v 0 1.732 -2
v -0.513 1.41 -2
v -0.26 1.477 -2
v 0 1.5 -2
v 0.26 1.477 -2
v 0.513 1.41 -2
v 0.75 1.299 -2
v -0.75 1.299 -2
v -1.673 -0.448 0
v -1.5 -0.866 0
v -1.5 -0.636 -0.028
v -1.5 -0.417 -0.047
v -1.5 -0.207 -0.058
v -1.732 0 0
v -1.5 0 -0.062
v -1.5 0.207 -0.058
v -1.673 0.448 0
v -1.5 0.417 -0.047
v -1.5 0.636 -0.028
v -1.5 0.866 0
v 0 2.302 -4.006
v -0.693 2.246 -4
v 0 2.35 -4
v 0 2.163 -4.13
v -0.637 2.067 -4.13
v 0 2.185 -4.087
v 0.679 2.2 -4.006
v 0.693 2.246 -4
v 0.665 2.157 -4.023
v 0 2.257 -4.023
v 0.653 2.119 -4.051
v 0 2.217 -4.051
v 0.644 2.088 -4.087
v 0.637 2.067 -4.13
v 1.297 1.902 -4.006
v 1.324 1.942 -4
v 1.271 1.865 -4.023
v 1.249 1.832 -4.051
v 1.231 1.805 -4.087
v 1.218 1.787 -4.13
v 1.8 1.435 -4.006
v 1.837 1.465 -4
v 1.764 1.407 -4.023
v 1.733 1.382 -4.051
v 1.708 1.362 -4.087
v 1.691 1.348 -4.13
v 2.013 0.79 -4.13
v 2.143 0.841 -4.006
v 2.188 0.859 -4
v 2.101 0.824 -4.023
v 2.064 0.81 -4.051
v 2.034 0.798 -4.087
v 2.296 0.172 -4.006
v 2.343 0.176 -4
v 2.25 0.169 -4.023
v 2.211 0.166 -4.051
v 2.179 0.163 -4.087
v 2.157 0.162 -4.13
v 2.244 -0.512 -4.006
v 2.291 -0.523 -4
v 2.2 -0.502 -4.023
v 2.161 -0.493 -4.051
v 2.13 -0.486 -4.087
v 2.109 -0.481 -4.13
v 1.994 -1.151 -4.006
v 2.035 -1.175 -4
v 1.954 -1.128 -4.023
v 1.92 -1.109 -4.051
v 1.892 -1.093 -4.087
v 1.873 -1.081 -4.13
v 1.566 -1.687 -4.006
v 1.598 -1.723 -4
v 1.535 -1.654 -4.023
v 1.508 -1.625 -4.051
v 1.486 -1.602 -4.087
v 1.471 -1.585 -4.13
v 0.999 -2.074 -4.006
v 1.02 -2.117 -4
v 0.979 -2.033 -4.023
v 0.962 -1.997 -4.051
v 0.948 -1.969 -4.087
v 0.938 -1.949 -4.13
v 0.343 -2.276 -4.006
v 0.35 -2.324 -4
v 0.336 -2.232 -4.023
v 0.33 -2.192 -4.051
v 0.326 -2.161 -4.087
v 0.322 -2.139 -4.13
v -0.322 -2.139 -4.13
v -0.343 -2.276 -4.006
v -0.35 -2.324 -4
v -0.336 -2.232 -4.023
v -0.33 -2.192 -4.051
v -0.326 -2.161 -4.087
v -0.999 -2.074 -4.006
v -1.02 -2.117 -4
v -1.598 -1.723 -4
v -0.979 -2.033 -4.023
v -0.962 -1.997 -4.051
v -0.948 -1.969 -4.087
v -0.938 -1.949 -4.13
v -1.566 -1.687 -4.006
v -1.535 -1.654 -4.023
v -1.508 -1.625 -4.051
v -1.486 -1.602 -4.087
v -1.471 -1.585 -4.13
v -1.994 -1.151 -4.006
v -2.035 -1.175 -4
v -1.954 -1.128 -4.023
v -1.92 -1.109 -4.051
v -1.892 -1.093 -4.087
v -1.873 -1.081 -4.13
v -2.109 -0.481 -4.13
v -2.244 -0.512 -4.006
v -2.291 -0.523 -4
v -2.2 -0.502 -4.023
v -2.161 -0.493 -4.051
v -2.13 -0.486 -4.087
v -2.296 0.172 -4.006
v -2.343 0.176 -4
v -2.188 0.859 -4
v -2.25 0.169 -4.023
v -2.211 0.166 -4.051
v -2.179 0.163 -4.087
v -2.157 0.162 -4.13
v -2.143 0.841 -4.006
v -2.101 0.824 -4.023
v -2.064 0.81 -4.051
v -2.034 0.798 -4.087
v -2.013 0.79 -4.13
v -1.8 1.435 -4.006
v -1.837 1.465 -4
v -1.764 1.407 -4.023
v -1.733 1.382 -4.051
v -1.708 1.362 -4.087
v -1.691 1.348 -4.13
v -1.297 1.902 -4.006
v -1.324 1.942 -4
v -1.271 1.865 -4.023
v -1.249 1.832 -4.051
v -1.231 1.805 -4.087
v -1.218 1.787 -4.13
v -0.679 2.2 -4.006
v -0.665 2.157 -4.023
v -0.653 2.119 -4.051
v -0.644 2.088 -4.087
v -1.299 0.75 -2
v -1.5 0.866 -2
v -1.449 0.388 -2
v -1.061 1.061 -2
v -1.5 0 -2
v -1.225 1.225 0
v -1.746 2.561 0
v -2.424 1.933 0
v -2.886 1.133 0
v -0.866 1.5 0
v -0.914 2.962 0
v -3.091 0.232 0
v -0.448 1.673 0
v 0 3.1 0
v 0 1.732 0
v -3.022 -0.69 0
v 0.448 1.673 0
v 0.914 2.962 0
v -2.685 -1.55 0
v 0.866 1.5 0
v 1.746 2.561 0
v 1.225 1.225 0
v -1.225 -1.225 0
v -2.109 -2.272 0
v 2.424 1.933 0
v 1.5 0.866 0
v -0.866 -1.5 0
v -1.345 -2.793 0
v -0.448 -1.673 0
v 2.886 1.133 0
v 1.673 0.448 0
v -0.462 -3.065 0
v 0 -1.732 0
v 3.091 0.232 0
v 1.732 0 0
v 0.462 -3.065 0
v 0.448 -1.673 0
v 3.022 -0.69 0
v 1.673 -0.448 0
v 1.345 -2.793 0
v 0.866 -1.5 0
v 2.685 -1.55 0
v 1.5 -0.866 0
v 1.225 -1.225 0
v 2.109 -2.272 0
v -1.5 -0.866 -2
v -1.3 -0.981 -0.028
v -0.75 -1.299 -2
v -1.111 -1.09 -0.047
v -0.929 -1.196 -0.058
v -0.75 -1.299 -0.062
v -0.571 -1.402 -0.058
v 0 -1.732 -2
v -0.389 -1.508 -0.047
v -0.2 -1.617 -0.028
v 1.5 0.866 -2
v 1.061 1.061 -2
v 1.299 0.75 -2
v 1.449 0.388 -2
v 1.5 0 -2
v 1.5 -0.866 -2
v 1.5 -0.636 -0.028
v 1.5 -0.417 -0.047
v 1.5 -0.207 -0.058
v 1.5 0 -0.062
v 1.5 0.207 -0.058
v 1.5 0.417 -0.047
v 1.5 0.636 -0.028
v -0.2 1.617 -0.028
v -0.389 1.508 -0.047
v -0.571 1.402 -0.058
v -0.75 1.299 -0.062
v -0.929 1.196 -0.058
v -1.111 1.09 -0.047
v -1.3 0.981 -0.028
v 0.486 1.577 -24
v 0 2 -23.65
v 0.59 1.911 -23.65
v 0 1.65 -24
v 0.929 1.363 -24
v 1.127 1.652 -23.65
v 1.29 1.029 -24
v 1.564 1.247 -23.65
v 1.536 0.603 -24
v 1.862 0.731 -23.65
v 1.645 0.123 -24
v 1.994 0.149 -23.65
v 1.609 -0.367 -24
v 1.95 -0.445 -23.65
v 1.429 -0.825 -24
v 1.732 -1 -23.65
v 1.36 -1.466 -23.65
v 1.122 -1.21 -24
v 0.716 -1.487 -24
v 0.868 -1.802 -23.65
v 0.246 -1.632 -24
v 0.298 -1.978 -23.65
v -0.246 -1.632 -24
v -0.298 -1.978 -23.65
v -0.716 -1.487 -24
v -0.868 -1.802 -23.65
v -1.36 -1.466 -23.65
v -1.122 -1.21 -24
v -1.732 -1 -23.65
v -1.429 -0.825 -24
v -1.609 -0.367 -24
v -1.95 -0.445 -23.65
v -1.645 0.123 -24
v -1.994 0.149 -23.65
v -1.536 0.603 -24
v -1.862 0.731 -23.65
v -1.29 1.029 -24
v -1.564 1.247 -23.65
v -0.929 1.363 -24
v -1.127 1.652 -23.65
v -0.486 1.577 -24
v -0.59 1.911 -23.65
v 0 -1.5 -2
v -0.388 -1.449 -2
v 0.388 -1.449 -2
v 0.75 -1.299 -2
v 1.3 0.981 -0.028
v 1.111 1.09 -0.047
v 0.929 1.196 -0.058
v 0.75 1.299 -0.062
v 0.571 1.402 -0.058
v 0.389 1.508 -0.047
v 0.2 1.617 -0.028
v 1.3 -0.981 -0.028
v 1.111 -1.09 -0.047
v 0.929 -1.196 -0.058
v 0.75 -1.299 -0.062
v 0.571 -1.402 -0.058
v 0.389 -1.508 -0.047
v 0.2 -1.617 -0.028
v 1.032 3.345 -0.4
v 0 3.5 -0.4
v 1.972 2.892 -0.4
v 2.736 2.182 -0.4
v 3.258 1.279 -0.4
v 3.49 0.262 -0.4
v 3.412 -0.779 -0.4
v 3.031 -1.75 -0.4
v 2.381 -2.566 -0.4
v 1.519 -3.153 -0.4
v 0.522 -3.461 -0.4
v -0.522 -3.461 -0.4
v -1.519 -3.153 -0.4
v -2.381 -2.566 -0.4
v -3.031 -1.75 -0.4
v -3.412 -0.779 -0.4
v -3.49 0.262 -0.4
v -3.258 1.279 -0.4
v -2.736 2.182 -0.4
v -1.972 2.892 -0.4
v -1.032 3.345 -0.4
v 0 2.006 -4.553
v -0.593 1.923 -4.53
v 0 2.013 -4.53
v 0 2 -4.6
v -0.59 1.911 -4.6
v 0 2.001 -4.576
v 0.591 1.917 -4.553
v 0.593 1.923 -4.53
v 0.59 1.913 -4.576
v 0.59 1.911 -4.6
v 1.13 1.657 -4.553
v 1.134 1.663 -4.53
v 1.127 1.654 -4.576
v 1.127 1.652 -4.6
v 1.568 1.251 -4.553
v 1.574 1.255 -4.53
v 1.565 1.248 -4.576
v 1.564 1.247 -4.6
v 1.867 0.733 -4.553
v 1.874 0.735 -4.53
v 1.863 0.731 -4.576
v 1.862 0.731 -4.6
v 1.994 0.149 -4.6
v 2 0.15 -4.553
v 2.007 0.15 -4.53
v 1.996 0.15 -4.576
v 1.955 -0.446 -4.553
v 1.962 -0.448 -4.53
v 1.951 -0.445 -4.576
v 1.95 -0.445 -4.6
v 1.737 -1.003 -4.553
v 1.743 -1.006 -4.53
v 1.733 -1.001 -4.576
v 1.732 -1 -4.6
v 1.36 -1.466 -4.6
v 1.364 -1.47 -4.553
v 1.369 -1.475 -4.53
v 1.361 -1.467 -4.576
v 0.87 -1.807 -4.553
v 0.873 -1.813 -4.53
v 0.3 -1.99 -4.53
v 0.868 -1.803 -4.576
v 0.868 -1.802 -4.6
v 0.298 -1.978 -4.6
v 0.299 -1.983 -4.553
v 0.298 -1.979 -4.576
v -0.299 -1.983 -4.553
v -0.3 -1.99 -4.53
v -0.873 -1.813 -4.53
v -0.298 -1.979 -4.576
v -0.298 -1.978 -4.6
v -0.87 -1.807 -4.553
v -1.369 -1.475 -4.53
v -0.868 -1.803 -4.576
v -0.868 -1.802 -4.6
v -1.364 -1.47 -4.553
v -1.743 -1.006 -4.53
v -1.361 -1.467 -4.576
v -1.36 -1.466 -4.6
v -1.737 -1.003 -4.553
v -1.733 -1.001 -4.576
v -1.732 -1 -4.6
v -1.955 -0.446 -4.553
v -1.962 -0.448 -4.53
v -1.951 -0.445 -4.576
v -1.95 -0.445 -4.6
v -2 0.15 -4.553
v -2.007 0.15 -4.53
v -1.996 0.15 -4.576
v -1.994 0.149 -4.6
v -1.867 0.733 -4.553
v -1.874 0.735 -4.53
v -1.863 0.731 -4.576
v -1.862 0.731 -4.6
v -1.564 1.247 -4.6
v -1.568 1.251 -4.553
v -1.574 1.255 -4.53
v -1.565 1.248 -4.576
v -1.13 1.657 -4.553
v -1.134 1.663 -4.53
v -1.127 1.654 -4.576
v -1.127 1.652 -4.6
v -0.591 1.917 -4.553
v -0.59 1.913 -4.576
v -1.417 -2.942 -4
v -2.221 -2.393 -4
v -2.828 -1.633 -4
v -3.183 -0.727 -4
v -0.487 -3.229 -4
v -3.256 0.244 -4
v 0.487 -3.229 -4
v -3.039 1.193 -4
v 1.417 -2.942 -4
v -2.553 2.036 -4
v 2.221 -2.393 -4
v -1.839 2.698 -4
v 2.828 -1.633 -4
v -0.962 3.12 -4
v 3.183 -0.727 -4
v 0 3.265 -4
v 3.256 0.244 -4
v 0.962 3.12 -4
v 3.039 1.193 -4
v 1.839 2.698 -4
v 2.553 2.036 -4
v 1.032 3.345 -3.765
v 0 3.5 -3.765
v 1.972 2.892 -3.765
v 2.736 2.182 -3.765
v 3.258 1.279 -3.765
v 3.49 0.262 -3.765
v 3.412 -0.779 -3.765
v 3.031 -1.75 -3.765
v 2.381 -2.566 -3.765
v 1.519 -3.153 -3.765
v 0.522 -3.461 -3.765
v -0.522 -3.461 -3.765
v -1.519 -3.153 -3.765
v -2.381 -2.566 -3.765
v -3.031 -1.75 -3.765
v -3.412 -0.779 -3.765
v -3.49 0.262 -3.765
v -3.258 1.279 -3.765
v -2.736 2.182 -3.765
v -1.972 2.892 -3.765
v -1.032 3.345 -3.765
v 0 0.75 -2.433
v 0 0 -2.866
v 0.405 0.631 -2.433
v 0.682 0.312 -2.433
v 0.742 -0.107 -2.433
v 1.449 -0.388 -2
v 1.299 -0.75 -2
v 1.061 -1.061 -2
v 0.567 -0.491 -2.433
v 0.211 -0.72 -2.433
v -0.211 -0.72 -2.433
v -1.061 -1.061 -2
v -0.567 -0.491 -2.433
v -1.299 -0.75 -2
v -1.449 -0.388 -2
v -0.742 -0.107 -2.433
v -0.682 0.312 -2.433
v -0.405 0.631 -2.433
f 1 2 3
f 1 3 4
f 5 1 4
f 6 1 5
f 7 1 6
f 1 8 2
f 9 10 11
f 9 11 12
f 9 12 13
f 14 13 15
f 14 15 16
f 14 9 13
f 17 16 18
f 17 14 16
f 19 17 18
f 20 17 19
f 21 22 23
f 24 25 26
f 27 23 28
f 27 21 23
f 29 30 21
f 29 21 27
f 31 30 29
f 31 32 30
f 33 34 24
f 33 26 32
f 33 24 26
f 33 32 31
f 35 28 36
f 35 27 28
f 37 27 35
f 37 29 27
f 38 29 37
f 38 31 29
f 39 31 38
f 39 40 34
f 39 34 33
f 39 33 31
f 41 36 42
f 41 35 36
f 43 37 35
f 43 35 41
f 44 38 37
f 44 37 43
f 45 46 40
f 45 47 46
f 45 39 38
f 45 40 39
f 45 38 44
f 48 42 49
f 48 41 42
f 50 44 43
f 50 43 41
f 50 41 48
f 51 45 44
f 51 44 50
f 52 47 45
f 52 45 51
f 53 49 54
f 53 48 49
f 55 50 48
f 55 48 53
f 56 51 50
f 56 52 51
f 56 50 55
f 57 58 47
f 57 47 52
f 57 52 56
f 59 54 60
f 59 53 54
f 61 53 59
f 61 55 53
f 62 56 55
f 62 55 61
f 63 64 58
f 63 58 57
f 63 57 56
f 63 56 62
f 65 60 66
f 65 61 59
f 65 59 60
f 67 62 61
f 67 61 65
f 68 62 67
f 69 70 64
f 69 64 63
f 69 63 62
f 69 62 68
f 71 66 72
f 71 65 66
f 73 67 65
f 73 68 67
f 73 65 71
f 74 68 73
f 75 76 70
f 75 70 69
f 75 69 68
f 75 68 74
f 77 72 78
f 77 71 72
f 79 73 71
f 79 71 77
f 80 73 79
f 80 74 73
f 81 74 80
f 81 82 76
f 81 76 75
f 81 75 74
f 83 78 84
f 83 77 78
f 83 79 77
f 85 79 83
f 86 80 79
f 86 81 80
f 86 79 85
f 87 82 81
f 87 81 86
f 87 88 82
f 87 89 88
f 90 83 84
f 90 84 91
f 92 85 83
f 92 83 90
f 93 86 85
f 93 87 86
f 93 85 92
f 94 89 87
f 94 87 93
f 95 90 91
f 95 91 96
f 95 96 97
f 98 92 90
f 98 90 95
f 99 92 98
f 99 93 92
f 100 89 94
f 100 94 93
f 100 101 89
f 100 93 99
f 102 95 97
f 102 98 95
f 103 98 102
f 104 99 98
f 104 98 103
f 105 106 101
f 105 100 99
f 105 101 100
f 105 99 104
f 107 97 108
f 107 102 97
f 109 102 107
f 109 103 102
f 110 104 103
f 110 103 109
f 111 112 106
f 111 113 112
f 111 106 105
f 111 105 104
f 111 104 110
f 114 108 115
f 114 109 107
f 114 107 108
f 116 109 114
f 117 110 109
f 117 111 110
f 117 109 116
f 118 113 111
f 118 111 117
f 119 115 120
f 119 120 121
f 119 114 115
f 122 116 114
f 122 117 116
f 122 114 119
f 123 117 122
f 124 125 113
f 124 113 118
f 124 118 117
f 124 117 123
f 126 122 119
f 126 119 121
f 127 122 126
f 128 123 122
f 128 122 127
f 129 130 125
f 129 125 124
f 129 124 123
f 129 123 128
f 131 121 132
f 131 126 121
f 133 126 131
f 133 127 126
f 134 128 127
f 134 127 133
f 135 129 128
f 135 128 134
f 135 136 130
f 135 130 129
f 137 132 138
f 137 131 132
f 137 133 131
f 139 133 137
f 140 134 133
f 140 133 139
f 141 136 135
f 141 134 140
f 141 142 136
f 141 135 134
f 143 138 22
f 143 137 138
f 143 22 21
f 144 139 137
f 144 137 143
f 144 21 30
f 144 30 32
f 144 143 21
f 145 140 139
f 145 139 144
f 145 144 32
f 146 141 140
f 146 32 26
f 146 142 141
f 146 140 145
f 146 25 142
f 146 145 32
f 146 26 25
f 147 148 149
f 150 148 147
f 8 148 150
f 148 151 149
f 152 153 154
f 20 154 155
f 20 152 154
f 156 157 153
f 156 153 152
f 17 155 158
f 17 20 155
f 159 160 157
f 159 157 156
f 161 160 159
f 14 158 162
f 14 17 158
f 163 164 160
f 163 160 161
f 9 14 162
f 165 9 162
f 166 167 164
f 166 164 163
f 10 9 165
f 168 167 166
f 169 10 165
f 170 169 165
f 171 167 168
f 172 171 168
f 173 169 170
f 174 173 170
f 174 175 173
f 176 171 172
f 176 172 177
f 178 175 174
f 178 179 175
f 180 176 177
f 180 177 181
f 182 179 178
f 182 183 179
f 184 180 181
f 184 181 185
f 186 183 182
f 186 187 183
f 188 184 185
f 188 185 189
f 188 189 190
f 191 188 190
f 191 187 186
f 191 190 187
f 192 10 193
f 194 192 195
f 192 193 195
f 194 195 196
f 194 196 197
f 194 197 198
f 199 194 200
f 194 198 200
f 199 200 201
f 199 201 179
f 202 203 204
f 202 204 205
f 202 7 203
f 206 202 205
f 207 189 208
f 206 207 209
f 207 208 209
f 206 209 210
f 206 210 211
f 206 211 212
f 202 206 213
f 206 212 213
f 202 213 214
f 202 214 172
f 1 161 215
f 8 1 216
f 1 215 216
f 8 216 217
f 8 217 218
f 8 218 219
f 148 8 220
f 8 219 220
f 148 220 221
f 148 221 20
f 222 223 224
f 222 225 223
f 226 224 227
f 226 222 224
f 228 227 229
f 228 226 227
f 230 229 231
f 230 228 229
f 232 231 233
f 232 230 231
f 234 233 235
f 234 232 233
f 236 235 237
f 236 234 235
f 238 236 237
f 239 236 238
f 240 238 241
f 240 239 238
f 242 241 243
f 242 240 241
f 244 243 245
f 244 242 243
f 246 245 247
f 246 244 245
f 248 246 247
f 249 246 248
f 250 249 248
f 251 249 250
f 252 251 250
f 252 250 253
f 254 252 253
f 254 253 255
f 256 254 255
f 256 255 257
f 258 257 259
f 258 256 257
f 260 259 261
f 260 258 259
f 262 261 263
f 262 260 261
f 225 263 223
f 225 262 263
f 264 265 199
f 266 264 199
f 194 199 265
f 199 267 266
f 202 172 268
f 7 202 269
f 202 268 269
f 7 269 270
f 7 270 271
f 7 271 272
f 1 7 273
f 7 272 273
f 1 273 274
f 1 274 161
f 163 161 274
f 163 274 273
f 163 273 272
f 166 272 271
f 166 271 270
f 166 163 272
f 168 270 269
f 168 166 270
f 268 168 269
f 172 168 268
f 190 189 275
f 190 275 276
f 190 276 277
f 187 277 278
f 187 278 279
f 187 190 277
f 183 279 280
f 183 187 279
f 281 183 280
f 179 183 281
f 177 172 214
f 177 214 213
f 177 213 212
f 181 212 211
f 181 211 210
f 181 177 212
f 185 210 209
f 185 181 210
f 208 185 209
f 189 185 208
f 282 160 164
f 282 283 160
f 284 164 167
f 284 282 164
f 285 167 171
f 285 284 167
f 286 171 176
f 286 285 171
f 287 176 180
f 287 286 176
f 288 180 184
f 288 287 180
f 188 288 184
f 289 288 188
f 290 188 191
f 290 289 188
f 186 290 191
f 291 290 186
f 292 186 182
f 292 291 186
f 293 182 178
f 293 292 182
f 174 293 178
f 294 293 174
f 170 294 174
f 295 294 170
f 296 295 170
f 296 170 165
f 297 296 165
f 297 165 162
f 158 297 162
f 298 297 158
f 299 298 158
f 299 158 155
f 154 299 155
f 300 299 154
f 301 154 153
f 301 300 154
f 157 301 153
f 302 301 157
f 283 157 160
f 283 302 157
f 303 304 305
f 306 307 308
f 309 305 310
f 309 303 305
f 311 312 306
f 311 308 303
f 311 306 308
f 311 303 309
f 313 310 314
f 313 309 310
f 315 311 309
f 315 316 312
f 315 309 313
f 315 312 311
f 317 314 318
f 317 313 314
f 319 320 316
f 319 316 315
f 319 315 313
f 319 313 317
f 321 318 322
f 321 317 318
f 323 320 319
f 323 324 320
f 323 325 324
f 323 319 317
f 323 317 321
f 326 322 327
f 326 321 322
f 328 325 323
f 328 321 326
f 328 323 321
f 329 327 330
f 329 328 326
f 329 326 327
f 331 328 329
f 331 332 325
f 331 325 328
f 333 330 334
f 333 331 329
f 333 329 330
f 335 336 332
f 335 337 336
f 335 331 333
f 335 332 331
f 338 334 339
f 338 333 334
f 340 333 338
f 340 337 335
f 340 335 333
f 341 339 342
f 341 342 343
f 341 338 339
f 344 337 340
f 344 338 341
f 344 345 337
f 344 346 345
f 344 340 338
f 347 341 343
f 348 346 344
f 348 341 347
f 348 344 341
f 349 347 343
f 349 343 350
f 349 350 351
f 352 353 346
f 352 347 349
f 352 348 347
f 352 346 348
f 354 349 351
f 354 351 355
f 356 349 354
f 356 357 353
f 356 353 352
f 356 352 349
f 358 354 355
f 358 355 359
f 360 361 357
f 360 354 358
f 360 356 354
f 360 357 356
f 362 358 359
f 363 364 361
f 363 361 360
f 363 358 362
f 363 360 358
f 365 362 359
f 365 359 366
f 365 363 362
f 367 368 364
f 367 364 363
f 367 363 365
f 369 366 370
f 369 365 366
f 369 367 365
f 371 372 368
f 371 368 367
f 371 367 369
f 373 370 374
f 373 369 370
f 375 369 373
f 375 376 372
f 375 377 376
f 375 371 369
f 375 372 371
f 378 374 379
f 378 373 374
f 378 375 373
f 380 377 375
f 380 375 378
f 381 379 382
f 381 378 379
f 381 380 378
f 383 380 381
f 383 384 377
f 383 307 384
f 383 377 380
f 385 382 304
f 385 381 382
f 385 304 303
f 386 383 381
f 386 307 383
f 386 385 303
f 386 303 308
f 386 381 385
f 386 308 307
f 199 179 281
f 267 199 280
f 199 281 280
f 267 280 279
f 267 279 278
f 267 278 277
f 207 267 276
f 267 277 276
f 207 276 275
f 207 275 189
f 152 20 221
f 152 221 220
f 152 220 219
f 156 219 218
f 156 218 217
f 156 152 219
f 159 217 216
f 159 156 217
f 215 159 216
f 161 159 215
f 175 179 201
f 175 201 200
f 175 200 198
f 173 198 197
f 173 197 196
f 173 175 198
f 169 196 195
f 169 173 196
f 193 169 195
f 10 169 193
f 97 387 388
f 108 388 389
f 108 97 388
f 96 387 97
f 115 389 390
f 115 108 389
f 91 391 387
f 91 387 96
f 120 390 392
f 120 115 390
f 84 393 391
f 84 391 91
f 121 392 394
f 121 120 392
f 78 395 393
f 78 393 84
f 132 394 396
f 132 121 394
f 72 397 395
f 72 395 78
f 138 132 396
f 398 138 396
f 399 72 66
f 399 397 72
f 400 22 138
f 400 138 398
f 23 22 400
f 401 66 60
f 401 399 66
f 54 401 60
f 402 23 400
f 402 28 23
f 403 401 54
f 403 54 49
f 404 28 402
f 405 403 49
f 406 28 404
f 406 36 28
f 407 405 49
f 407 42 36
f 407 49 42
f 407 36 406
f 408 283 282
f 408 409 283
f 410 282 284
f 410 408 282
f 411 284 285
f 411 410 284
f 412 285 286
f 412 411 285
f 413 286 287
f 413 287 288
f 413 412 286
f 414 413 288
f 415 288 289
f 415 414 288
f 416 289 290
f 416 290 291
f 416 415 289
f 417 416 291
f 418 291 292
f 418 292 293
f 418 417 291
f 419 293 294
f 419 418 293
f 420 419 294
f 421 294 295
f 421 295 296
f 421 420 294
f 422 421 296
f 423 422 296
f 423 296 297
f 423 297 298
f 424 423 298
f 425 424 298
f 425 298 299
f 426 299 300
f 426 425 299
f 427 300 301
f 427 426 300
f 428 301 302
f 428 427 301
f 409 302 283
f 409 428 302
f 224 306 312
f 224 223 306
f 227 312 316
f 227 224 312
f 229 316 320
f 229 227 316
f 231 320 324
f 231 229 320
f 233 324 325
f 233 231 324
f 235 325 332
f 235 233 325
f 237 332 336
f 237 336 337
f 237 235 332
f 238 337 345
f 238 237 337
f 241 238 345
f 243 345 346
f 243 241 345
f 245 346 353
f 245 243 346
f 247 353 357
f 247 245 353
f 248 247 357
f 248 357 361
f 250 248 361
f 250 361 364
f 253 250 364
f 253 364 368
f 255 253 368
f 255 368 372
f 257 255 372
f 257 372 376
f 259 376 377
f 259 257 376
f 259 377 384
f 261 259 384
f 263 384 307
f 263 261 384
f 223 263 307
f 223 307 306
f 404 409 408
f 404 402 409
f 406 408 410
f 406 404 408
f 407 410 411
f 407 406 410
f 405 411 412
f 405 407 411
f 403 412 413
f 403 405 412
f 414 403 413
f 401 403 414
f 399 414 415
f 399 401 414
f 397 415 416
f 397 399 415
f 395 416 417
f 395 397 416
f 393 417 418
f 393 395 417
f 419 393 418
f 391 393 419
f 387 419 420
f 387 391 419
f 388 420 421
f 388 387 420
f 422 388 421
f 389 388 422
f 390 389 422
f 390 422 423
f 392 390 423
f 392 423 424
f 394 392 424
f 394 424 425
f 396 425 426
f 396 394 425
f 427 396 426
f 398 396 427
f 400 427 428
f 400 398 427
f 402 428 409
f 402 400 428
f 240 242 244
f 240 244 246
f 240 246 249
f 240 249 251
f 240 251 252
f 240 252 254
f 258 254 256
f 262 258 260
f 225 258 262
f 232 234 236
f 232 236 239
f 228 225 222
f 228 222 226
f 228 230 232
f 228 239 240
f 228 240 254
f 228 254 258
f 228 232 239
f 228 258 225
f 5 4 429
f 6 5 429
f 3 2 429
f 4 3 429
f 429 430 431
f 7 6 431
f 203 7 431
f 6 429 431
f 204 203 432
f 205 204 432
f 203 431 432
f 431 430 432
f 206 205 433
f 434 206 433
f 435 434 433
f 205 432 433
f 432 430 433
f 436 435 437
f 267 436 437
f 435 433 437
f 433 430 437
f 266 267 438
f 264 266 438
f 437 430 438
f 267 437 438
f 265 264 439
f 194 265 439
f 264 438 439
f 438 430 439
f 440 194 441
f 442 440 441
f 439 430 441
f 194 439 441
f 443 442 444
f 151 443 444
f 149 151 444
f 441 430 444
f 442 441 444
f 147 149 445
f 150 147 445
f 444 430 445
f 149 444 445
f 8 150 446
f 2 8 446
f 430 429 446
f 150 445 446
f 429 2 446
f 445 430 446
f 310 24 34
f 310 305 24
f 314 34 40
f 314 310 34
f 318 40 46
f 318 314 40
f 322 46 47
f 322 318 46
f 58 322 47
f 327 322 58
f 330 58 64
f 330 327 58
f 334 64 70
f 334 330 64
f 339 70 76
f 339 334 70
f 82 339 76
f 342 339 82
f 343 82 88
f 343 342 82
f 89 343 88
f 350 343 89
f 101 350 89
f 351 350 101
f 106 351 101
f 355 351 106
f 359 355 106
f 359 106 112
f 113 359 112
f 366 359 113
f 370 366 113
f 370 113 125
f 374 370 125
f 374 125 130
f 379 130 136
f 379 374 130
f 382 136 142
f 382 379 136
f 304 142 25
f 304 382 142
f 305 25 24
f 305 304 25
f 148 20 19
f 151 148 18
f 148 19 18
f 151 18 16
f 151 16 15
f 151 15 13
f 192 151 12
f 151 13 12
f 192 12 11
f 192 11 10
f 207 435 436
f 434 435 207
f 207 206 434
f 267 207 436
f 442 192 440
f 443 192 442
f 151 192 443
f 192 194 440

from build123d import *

# Parameters (mm, degrees)
CUT_EXTRUDE1_DEPTH = 2


with BuildPart() as part:
    # Sketch1 → Revolve1 (revolve)
    with BuildSketch(Plane(origin=(0, 0, 0), x_dir=(0, 0, -1), z_dir=(1, 0, 0))):
        with BuildLine():
            Line((0, 0), (0, 3.1))
            Line((0, 3.1), (0.4, 3.5))
            Line((0.4, 3.5), (3.765, 3.5))
            Line((3.765, 3.5), (4, 3.265))
            Line((4, 3.265), (4, 2.35))
            ThreePointArc((4, 2.35), (4.035614876, 2.236081032), (4.129775312, 2.162734164))
            Line((4.129775312, 2.162734164), (4.529775312, 2.012734164))
            ThreePointArc((4.529775312, 2.012734164), (4.564315039, 2.00320929), (4.6, 2))
            Line((4.6, 2), (23.65, 2))
            Line((23.65, 2), (24, 1.65))
            Line((24, 1.65), (24, 0))
            Line((24, 0), (0, 0))
        make_face()
    revolve(axis=Axis((0, 0, 0), (0, 0, -1)))

    # Sketch2 → Cut-Extrude1 (cut)
    with BuildSketch(Plane.XY):
        Polygon((0, 1.732050808), (-1.5, 0.866025404), (-1.5, -0.866025404), (0, -1.732050808), (1.5, -0.866025404), (1.5, 0.866025404), align=None)
    extrude(amount=-CUT_EXTRUDE1_DEPTH, mode=Mode.SUBTRACT)

    # Sketch3 → Cut-Revolve2 (revolve, cut)
    with BuildSketch(Plane(origin=(0, 0, 0), x_dir=(0, 0, -1), z_dir=(1, 0, 0))):
        Polygon((2, 0), (2, 1.5), (2.866025404, 0), align=None)
    revolve(axis=Axis((0, 0, -2), (0, 0, -1)), mode=Mode.SUBTRACT)

    # Sketch4 → Cut-Revolve3 (revolve, cut)
    with BuildSketch(Plane(origin=(0, 0, 0), x_dir=(0, 0, -1), z_dir=(1, 0, 0))):
        Polygon((0, 1.732050808), (0, 1.5), (0.062177826, 1.5), align=None)
    revolve(axis=Axis((0, 0, 0), (0, 0, -1)), mode=Mode.SUBTRACT)


solid = part.part
